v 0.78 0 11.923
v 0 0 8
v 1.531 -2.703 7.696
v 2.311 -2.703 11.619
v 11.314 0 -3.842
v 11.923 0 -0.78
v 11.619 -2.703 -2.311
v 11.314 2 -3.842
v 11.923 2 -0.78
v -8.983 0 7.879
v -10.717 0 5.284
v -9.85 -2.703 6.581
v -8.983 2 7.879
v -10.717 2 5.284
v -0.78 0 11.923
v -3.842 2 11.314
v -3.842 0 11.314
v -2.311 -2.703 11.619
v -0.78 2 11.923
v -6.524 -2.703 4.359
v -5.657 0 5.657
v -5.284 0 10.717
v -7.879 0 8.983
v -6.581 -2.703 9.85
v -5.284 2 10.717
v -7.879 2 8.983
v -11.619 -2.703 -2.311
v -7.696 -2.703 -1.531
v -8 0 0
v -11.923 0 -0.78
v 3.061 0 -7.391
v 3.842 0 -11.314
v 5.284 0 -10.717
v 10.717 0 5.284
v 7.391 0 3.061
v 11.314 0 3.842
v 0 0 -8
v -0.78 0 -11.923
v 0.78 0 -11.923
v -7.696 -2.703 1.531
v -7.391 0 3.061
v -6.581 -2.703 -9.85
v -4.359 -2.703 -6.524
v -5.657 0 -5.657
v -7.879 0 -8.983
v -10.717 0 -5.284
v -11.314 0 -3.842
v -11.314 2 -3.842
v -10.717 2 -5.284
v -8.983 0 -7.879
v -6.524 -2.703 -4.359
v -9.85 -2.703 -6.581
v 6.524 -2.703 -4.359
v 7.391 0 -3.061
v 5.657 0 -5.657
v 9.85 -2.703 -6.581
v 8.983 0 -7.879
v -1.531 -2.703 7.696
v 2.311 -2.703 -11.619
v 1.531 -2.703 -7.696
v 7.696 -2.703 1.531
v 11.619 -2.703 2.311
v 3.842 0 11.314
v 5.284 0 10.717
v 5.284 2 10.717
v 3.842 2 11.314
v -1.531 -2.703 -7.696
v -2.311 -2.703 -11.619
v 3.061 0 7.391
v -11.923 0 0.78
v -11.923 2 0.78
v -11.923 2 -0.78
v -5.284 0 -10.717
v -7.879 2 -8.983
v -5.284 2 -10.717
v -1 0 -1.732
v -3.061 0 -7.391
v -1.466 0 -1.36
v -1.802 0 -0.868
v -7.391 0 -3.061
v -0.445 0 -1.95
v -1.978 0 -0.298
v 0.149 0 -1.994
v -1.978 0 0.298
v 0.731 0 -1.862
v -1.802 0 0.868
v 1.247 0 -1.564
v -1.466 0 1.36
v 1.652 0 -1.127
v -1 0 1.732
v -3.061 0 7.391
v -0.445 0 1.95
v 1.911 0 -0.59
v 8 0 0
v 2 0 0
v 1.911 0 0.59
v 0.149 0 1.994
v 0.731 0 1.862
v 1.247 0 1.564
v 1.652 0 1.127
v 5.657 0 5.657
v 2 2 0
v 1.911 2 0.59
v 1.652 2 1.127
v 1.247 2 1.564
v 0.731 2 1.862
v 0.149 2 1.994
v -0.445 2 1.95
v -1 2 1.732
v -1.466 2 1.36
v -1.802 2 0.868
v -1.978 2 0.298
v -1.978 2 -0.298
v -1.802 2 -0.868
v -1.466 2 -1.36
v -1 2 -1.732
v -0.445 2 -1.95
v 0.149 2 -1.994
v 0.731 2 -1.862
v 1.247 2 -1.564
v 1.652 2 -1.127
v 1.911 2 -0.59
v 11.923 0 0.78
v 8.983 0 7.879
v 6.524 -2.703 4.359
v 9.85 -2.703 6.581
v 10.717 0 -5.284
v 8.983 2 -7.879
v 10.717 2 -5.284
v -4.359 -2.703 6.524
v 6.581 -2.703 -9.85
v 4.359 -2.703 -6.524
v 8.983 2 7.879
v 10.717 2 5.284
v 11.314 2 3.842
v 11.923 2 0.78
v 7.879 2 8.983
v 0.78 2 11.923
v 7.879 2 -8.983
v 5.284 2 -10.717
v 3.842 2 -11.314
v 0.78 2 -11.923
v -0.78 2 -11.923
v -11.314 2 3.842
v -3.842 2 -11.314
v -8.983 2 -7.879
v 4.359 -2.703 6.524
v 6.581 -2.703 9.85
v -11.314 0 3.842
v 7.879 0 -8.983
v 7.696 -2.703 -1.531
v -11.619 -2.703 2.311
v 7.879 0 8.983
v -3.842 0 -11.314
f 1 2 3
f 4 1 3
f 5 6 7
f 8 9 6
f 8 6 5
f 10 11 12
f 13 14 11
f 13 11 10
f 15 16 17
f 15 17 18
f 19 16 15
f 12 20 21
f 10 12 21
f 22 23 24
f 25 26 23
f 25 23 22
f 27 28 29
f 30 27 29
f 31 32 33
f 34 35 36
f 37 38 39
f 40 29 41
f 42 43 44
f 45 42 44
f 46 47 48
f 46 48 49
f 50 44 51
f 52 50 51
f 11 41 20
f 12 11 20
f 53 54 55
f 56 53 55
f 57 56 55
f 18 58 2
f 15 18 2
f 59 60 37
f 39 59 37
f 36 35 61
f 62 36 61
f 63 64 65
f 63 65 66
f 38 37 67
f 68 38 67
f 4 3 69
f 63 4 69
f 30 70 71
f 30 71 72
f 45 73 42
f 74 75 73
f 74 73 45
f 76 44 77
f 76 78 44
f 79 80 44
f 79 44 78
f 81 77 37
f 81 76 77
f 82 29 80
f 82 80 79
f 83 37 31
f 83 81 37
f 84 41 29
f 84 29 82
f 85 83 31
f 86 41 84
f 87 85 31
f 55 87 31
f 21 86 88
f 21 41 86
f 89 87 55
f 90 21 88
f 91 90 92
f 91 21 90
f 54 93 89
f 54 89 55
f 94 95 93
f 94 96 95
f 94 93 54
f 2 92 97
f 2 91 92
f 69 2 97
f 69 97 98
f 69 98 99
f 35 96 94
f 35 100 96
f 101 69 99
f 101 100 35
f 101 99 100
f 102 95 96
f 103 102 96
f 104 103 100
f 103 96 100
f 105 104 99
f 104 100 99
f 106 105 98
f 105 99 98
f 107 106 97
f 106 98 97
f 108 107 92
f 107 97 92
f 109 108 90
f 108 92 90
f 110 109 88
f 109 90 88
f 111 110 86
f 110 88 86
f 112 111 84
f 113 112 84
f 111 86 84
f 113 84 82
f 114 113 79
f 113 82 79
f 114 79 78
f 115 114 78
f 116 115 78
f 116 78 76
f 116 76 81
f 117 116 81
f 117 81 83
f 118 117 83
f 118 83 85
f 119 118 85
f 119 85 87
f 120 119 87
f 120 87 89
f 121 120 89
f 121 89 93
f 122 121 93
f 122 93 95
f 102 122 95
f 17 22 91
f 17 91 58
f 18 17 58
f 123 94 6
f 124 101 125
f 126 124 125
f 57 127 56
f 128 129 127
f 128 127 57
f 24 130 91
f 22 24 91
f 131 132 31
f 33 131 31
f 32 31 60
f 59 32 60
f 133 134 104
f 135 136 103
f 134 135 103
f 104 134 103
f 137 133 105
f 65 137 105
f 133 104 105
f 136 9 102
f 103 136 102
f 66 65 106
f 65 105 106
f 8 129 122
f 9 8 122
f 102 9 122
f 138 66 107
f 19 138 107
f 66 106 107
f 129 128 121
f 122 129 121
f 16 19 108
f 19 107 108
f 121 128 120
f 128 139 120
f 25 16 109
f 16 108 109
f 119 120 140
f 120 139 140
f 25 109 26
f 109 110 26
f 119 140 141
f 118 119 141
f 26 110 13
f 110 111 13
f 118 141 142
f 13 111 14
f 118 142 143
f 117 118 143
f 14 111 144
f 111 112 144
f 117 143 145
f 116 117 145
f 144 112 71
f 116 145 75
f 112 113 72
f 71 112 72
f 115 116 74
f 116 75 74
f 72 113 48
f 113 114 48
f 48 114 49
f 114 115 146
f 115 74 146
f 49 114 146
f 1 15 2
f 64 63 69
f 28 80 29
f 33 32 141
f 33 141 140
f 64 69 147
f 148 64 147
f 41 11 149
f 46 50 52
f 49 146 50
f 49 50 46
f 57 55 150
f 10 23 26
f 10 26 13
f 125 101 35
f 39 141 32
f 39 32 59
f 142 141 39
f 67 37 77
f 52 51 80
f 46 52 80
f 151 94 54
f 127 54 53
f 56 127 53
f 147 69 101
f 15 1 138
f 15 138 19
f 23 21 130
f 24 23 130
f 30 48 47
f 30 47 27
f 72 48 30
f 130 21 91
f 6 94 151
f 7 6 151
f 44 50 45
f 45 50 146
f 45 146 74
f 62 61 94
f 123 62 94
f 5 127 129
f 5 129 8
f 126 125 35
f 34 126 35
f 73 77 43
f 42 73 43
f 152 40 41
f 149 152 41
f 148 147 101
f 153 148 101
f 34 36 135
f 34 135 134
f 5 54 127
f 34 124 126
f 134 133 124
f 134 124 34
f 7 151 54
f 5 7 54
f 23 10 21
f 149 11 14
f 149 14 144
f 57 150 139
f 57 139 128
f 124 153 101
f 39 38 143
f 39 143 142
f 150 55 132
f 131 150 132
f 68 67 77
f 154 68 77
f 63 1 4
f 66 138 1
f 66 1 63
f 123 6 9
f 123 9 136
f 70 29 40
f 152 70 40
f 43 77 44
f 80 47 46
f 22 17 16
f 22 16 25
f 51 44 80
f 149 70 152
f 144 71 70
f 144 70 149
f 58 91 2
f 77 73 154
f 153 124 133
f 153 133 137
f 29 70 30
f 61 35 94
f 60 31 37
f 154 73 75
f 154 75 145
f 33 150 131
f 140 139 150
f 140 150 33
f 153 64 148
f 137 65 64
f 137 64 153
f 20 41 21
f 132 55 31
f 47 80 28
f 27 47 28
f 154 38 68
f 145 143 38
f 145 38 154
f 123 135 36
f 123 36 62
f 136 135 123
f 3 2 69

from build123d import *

# Parameters (mm, degrees)
F1_DEPTH = 2
F0_R     = 2
F3_DEPTH = 4
F4_COUNT = 16


with BuildPart() as f1:
    # F0 (on Front) → F1 (new body)
    with BuildSketch(Plane.XZ):
        Polygon((-0.7803612881, 11.9231411216), (0, 8), (0.7803612881, 11.9231411216), align=None)
    extrude(amount=-F1_DEPTH)



with BuildPart() as f1b:
    # F0 (on Front) → F1, piece 2 (new body)
    with BuildSketch(Plane.XZ):
        Polygon((3.841828747, 11.3141773817), (3.0614674589, 7.3910362601), (5.283748391, 10.7169147093), align=None)
    extrude(amount=-F1_DEPTH)


with BuildPart() as f1c:
    # F0 (on Front) → F1, piece 3 (new body)
    with BuildSketch(Plane.XZ):
        Polygon((7.8791351816, 8.9827326987), (5.6568542495, 5.6568542495), (8.9827326987, 7.8791351816), align=None)
    extrude(amount=-F1_DEPTH)


with BuildPart() as f1d:
    # F0 (on Front) → F1, piece 4 (new body)
    with BuildSketch(Plane.XZ):
        Polygon((10.7169147093, 5.283748391), (7.3910362601, 3.0614674589), (11.3141773817, 3.841828747), align=None)
    extrude(amount=-F1_DEPTH)


with BuildPart() as f1e:
    # F0 (on Front) → F1, piece 5 (new body)
    with BuildSketch(Plane.XZ):
        Polygon((11.9231411216, 0.7803612881), (8, 0), (11.9231411216, -0.7803612881), align=None)
    extrude(amount=-F1_DEPTH)


with BuildPart() as f1f:
    # F0 (on Front) → F1, piece 6 (new body)
    with BuildSketch(Plane.XZ):
        Polygon((11.3141773817, -3.841828747), (7.3910362601, -3.0614674589), (10.7169147093, -5.283748391), align=None)
    extrude(amount=-F1_DEPTH)


with BuildPart() as f1g:
    # F0 (on Front) → F1, piece 7 (new body)
    with BuildSketch(Plane.XZ):
        Polygon((8.9827326987, -7.8791351816), (5.6568542495, -5.6568542495), (7.8791351816, -8.9827326987), align=None)
    extrude(amount=-F1_DEPTH)


with BuildPart() as f1h:
    # F0 (on Front) → F1, piece 8 (new body)
    with BuildSketch(Plane.XZ):
        Polygon((5.283748391, -10.7169147093), (3.0614674589, -7.3910362601), (3.841828747, -11.3141773817), align=None)
    extrude(amount=-F1_DEPTH)


with BuildPart() as f1i:
    # F0 (on Front) → F1, piece 9 (new body)
    with BuildSketch(Plane.XZ):
        Polygon((0.7803612881, -11.9231411216), (0, -8), (-0.7803612881, -11.9231411216), align=None)
    extrude(amount=-F1_DEPTH)


with BuildPart() as f1j:
    # F0 (on Front) → F1, piece 10 (new body)
    with BuildSketch(Plane.XZ):
        Polygon((-3.841828747, -11.3141773817), (-3.0614674589, -7.3910362601), (-5.283748391, -10.7169147093), align=None)
    extrude(amount=-F1_DEPTH)


with BuildPart() as f1k:
    # F0 (on Front) → F1, piece 11 (new body)
    with BuildSketch(Plane.XZ):
        Polygon((-7.8791351816, -8.9827326987), (-5.6568542495, -5.6568542495), (-8.9827326987, -7.8791351816), align=None)
    extrude(amount=-F1_DEPTH)


with BuildPart() as f1l:
    # F0 (on Front) → F1, piece 12 (new body)
    with BuildSketch(Plane.XZ):
        Polygon((-10.7169147093, -5.283748391), (-7.3910362601, -3.0614674589), (-11.3141773817, -3.841828747), align=None)
    extrude(amount=-F1_DEPTH)


with BuildPart() as f1m:
    # F0 (on Front) → F1, piece 13 (new body)
    with BuildSketch(Plane.XZ):
        Polygon((-11.9231411216, -0.7803612881), (-8, 0), (-11.9231411216, 0.7803612881), align=None)
    extrude(amount=-F1_DEPTH)


with BuildPart() as f1n:
    # F0 (on Front) → F1, piece 14 (new body)
    with BuildSketch(Plane.XZ):
        Polygon((-11.3141773817, 3.841828747), (-7.3910362601, 3.0614674589), (-10.7169147093, 5.283748391), align=None)
    extrude(amount=-F1_DEPTH)


with BuildPart() as f1o:
    # F0 (on Front) → F1, piece 15 (new body)
    with BuildSketch(Plane.XZ):
        Polygon((-8.9827326987, 7.8791351816), (-5.6568542495, 5.6568542495), (-7.8791351816, 8.9827326987), align=None)
    extrude(amount=-F1_DEPTH)


with BuildPart() as f1p:
    # F0 (on Front) → F1, piece 16 (new body)
    with BuildSketch(Plane.XZ):
        Polygon((0, 8), (-3.0614674589, 7.3910362601), (-5.6568542495, 5.6568542495), (-7.3910362601, 3.0614674589), (-8, 0), (-7.3910362601, -3.0614674589), (-5.6568542495, -5.6568542495), (-3.0614674589, -7.3910362601), (0, -8), (3.0614674589, -7.3910362601), (5.6568542495, -5.6568542495), (7.3910362601, -3.0614674589), (8, 0), (7.3910362601, 3.0614674589), (5.6568542495, 5.6568542495), (3.0614674589, 7.3910362601), align=None)
        Circle(F0_R, mode=Mode.SUBTRACT)
    extrude(amount=-F1_DEPTH)


with BuildPart() as f1q:
    # F0 (on Front) → F1, piece 17 (new body)
    with BuildSketch(Plane.XZ):
        Polygon((-5.283748391, 10.7169147093), (-3.0614674589, 7.3910362601), (-3.841828747, 11.3141773817), align=None)
    extrude(amount=-F1_DEPTH)


with BuildPart() as f1_1:
    add(f1.part)

    add(f1p.part)  # F3 merges F1p

    add(f1q.part)  # F3 merges F1q
    # F2 (on face) → F3 (join)
    with BuildSketch(Plane(origin=(-1.5307337295, 0, 7.69551813), x_dir=(0.9807852804, 0, 0.195090322), z_dir=(-0.195090322, 0, 0.9807852804))):
        Polygon((-1.5607225761, 2), (-1.5607225761, 0), (0, -2.7032507984), (1.5607225761, 0), (1.5607225761, 2), align=None)
    extrude(amount=F3_DEPTH)



with BuildPart() as f1_2:
    add(f1_1.part)

    add(f1b.part)  # F4 merges F1b

    add(f1c.part)  # F4 merges F1c

    add(f1d.part)  # F4 merges F1d

    add(f1e.part)  # F4 merges F1e

    add(f1f.part)  # F4 merges F1f

    add(f1g.part)  # F4 merges F1g

    add(f1h.part)  # F4 merges F1h

    add(f1i.part)  # F4 merges F1i

    add(f1j.part)  # F4 merges F1j

    add(f1k.part)  # F4 merges F1k

    add(f1l.part)  # F4 merges F1l

    add(f1m.part)  # F4 merges F1m

    add(f1n.part)  # F4 merges F1n

    add(f1o.part)  # F4 merges F1o
    # F4: F1 ×16 about axis
    f4_axis = Axis((0, 0, 0), (0, -1, 0))
    for i in range(1, F4_COUNT):
        add(f1_1.part.rotate(f4_axis, i * 360 / F4_COUNT))


solid = f1_2.part
